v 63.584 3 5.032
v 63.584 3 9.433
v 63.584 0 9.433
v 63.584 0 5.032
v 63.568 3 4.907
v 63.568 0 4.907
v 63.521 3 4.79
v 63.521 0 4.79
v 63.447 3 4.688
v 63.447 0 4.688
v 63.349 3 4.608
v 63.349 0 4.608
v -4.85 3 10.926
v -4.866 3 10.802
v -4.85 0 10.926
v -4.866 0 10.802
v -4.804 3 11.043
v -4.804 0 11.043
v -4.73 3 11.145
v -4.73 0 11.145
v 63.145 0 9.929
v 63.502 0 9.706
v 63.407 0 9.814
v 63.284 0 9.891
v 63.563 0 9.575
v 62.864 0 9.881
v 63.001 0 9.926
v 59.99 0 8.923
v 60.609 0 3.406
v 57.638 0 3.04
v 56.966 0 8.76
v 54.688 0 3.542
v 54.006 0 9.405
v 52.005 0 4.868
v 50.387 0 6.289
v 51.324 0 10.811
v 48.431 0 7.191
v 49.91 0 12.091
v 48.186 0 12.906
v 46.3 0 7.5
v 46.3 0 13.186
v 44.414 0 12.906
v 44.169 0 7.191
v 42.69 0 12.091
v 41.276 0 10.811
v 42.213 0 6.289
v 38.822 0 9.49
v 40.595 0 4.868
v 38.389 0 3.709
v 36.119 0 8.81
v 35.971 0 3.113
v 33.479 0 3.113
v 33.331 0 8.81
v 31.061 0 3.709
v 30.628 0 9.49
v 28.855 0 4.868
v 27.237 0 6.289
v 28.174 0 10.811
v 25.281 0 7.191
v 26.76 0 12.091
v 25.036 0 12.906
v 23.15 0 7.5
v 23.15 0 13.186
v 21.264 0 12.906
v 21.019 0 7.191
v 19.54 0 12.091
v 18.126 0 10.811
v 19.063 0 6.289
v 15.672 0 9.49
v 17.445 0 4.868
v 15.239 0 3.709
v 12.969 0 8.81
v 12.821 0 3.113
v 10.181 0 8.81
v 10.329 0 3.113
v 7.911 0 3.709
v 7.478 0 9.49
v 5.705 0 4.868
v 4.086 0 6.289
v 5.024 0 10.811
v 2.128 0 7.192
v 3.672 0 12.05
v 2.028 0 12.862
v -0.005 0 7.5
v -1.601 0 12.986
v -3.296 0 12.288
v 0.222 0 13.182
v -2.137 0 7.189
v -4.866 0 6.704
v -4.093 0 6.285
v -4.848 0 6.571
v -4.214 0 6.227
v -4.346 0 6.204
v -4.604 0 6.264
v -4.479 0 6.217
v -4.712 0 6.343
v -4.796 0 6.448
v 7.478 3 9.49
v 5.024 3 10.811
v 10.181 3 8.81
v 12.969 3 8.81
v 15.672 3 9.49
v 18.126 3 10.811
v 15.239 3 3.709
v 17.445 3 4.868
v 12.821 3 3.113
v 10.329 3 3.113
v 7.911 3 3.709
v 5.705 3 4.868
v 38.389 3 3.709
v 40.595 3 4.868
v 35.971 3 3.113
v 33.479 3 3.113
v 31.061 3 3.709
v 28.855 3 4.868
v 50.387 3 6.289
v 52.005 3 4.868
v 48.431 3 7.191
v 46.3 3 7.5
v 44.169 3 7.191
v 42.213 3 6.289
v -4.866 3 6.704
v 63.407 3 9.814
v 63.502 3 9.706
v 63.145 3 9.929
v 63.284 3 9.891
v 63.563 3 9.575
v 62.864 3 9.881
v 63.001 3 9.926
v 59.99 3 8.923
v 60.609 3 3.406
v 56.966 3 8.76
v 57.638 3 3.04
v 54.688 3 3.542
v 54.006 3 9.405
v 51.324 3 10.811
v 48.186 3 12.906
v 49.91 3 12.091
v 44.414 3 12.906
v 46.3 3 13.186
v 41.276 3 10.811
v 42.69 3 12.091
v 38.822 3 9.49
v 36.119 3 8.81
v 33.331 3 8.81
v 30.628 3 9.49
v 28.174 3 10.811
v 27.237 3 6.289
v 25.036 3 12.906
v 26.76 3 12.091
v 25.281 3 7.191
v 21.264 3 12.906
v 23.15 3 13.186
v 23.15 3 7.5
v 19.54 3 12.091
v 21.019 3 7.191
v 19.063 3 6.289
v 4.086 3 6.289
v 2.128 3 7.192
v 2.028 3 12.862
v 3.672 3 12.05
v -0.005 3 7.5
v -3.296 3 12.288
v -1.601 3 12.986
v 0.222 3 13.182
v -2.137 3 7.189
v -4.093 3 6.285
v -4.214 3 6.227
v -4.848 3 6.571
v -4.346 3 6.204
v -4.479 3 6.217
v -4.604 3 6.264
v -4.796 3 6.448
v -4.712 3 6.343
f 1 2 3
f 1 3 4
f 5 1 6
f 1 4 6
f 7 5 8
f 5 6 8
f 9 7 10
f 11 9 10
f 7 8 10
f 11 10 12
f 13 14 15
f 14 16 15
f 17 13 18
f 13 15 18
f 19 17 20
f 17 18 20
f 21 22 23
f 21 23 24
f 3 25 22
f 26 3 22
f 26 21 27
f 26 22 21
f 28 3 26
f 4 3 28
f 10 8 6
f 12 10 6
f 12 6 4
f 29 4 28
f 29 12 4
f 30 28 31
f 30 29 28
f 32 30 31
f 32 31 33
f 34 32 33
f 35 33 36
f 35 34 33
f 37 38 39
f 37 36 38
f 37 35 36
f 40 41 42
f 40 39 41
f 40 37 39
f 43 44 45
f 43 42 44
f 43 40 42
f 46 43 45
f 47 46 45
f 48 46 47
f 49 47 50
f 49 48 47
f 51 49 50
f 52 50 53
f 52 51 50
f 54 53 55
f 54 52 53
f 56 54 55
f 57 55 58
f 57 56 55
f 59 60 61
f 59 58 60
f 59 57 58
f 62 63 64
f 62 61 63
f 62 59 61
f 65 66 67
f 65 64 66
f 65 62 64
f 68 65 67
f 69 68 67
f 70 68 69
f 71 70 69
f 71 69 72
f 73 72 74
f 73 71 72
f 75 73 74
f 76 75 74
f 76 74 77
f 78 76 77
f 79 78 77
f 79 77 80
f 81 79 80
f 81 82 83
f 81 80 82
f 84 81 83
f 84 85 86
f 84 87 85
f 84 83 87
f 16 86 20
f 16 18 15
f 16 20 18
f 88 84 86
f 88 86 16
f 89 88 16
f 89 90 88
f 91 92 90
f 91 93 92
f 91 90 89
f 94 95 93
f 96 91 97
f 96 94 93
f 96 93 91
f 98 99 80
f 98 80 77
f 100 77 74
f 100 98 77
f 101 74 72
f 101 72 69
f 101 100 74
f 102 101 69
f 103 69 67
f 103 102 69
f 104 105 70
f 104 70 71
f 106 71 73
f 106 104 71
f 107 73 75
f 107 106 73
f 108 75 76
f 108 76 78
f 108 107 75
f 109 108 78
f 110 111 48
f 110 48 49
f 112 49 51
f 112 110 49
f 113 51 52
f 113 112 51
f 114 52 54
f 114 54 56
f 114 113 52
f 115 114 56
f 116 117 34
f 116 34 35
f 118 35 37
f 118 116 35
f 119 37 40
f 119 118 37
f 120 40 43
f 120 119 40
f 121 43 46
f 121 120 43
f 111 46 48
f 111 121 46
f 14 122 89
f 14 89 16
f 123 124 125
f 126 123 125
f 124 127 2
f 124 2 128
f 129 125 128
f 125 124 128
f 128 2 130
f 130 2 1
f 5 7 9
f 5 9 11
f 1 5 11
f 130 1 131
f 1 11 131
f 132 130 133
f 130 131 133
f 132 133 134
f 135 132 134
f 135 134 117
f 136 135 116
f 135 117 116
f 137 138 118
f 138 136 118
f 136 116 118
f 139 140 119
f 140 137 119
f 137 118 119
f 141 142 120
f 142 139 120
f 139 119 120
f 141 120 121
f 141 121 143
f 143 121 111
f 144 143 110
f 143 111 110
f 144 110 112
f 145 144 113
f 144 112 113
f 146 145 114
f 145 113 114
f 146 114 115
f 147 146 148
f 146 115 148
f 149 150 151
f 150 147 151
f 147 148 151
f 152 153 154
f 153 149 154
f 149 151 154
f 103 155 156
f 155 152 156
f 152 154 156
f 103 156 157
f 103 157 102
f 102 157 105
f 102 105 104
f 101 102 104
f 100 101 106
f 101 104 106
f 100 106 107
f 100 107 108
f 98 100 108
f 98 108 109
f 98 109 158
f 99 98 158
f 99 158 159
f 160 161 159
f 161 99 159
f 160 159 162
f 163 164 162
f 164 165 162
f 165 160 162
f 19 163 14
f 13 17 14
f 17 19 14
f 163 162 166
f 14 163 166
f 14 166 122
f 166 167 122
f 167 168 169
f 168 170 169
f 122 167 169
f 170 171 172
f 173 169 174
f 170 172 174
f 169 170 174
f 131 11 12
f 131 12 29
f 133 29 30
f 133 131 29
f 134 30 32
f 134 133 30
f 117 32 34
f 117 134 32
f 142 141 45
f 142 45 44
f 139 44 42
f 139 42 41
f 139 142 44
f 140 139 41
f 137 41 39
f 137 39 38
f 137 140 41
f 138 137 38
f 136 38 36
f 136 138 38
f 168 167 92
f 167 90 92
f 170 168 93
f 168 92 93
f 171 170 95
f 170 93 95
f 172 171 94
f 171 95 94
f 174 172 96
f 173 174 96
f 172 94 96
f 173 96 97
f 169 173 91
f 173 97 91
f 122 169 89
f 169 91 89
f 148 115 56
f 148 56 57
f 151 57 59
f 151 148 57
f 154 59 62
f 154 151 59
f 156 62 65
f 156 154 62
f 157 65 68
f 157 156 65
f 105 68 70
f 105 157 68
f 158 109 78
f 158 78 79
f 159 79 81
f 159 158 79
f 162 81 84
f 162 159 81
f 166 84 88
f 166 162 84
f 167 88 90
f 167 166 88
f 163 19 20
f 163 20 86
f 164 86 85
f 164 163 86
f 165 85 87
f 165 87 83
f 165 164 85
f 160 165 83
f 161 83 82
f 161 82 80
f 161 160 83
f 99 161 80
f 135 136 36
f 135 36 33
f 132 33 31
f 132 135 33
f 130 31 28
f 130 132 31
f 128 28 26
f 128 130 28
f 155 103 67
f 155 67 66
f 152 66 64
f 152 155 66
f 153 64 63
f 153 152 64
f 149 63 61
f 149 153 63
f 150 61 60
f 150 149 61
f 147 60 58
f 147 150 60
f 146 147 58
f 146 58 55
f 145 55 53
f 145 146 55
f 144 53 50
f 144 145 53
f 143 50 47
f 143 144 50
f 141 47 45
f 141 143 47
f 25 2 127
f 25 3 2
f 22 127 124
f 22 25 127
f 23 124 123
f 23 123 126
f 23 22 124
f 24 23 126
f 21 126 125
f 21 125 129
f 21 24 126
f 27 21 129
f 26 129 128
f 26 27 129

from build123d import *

# Parameters (mm, degrees)
BOSS_EXTRUDE1_DEPTH = 3
SKETCH2_W           = 75.494873271
SKETCH2_H           = 16.574066579
CUT_EXTRUDE1_DEPTH  = 3
FILLET1_R           = 0.5


with BuildPart() as part:
    # Sketch1 → Boss-Extrude1 (new body)
    with BuildSketch(Plane(origin=(0, 0, 0), x_dir=(1, 0, 0), z_dir=(0, 1, 0))):
        with BuildLine():
            ThreePointArc((51.666035076, -4.495071474), (57.875, -2.537392354), (64.083964924, -4.495071474))
            Line((64.083964924, -4.495071474), (64.083964924, -11.181167218))
            ThreePointArc((64.083964924, -11.181167218), (57.875, -9.223488098), (51.666035076, -11.181167218))
            ThreePointArc((51.666035076, -11.181167218), (46.3, -13.686095744), (40.933964924, -11.181167218))
            ThreePointArc((40.933964924, -11.181167218), (34.725, -9.223488098), (28.516035077, -11.181167218))
            ThreePointArc((28.516035077, -11.181167218), (23.15, -13.686095744), (17.783964924, -11.181167218))
            ThreePointArc((17.783964924, -11.181167218), (11.575, -9.223488098), (5.366035077, -11.181167218))
            ThreePointArc((5.366035077, -11.181167218), (0, -13.686095744), (-5.366035076, -11.181167218))
            Line((-5.366035076, -11.181167218), (-5.366035076, -4.495071474))
            ThreePointArc((-5.366035076, -4.495071474), (0, -7), (5.366035076, -4.495071474))
            ThreePointArc((5.366035076, -4.495071474), (11.575, -2.537392354), (17.783964924, -4.495071474))
            ThreePointArc((17.783964924, -4.495071474), (23.15, -7), (28.516035076, -4.495071474))
            ThreePointArc((28.516035076, -4.495071474), (34.725, -2.537392354), (40.933964924, -4.495071474))
            ThreePointArc((40.933964924, -4.495071474), (46.3, -7), (51.666035076, -4.495071474))
        make_face()
    extrude(amount=BOSS_EXTRUDE1_DEPTH)

    # Sketch2 → Cut-Extrude1 (cut)
    with BuildSketch(Plane(origin=(0, 3, 0), x_dir=(1, 0, 0), z_dir=(0, 1, 0))):
        with Locations((29.270514079, -6.984979931)):
            Rectangle(SKETCH2_W, SKETCH2_H)
        with BuildLine():
            Line((63.583964924, -10.267724094), (63.583964924, -4.759291488))
            ThreePointArc((63.583964924, -4.759291488), (57.778030808, -3.037847716), (52.005454008, -4.868038061))
            ThreePointArc((52.005454008, -4.868038061), (46.3, -7.5), (40.594545992, -4.868038061))
            ThreePointArc((40.594545992, -4.868038061), (34.725, -3.037392354), (28.855454008, -4.868038061))
            ThreePointArc((28.855454008, -4.868038061), (23.15, -7.5), (17.444545992, -4.868038061))
            ThreePointArc((17.444545992, -4.868038061), (11.575, -3.037392354), (5.705454008, -4.868038061))
            ThreePointArc((5.705454008, -4.868038061), (0.593454673, -7.476483903), (-4.866035076, -5.707162398))
            Line((-4.866035076, -5.707162398), (-4.866035076, -10.995585579))
            ThreePointArc((-4.866035076, -10.995585579), (0.121449449, -13.184961032), (5.023650974, -10.810769172))
            ThreePointArc((5.023650974, -10.810769172), (11.575, -8.723488098), (18.126349026, -10.810769172))
            ThreePointArc((18.126349026, -10.810769172), (23.15, -13.186095744), (28.173650974, -10.810769172))
            ThreePointArc((28.173650974, -10.810769172), (34.725, -8.723488098), (41.276349026, -10.810769172))
            ThreePointArc((41.276349026, -10.810769172), (46.3, -13.186095744), (51.323650974, -10.810769172))
            ThreePointArc((51.323650974, -10.810769172), (57.373874034, -8.734580825), (63.583964924, -10.267724094))
        make_face(mode=Mode.SUBTRACT)
    extrude(amount=-CUT_EXTRUDE1_DEPTH, mode=Mode.SUBTRACT)

    # Fillet1
    fillet1_edges = [part.edges().sort_by_distance(p)[0] for p in [
        (63.583964924, 1.5, 10.267724094),
        (63.583964924, 1.5, 4.759291488),
        (-4.866035076, 1.5, 5.707162398),
        (-4.866035076, 1.5, 10.995585579),
    ]]
    fillet(fillet1_edges, radius=FILLET1_R)


solid = part.part
